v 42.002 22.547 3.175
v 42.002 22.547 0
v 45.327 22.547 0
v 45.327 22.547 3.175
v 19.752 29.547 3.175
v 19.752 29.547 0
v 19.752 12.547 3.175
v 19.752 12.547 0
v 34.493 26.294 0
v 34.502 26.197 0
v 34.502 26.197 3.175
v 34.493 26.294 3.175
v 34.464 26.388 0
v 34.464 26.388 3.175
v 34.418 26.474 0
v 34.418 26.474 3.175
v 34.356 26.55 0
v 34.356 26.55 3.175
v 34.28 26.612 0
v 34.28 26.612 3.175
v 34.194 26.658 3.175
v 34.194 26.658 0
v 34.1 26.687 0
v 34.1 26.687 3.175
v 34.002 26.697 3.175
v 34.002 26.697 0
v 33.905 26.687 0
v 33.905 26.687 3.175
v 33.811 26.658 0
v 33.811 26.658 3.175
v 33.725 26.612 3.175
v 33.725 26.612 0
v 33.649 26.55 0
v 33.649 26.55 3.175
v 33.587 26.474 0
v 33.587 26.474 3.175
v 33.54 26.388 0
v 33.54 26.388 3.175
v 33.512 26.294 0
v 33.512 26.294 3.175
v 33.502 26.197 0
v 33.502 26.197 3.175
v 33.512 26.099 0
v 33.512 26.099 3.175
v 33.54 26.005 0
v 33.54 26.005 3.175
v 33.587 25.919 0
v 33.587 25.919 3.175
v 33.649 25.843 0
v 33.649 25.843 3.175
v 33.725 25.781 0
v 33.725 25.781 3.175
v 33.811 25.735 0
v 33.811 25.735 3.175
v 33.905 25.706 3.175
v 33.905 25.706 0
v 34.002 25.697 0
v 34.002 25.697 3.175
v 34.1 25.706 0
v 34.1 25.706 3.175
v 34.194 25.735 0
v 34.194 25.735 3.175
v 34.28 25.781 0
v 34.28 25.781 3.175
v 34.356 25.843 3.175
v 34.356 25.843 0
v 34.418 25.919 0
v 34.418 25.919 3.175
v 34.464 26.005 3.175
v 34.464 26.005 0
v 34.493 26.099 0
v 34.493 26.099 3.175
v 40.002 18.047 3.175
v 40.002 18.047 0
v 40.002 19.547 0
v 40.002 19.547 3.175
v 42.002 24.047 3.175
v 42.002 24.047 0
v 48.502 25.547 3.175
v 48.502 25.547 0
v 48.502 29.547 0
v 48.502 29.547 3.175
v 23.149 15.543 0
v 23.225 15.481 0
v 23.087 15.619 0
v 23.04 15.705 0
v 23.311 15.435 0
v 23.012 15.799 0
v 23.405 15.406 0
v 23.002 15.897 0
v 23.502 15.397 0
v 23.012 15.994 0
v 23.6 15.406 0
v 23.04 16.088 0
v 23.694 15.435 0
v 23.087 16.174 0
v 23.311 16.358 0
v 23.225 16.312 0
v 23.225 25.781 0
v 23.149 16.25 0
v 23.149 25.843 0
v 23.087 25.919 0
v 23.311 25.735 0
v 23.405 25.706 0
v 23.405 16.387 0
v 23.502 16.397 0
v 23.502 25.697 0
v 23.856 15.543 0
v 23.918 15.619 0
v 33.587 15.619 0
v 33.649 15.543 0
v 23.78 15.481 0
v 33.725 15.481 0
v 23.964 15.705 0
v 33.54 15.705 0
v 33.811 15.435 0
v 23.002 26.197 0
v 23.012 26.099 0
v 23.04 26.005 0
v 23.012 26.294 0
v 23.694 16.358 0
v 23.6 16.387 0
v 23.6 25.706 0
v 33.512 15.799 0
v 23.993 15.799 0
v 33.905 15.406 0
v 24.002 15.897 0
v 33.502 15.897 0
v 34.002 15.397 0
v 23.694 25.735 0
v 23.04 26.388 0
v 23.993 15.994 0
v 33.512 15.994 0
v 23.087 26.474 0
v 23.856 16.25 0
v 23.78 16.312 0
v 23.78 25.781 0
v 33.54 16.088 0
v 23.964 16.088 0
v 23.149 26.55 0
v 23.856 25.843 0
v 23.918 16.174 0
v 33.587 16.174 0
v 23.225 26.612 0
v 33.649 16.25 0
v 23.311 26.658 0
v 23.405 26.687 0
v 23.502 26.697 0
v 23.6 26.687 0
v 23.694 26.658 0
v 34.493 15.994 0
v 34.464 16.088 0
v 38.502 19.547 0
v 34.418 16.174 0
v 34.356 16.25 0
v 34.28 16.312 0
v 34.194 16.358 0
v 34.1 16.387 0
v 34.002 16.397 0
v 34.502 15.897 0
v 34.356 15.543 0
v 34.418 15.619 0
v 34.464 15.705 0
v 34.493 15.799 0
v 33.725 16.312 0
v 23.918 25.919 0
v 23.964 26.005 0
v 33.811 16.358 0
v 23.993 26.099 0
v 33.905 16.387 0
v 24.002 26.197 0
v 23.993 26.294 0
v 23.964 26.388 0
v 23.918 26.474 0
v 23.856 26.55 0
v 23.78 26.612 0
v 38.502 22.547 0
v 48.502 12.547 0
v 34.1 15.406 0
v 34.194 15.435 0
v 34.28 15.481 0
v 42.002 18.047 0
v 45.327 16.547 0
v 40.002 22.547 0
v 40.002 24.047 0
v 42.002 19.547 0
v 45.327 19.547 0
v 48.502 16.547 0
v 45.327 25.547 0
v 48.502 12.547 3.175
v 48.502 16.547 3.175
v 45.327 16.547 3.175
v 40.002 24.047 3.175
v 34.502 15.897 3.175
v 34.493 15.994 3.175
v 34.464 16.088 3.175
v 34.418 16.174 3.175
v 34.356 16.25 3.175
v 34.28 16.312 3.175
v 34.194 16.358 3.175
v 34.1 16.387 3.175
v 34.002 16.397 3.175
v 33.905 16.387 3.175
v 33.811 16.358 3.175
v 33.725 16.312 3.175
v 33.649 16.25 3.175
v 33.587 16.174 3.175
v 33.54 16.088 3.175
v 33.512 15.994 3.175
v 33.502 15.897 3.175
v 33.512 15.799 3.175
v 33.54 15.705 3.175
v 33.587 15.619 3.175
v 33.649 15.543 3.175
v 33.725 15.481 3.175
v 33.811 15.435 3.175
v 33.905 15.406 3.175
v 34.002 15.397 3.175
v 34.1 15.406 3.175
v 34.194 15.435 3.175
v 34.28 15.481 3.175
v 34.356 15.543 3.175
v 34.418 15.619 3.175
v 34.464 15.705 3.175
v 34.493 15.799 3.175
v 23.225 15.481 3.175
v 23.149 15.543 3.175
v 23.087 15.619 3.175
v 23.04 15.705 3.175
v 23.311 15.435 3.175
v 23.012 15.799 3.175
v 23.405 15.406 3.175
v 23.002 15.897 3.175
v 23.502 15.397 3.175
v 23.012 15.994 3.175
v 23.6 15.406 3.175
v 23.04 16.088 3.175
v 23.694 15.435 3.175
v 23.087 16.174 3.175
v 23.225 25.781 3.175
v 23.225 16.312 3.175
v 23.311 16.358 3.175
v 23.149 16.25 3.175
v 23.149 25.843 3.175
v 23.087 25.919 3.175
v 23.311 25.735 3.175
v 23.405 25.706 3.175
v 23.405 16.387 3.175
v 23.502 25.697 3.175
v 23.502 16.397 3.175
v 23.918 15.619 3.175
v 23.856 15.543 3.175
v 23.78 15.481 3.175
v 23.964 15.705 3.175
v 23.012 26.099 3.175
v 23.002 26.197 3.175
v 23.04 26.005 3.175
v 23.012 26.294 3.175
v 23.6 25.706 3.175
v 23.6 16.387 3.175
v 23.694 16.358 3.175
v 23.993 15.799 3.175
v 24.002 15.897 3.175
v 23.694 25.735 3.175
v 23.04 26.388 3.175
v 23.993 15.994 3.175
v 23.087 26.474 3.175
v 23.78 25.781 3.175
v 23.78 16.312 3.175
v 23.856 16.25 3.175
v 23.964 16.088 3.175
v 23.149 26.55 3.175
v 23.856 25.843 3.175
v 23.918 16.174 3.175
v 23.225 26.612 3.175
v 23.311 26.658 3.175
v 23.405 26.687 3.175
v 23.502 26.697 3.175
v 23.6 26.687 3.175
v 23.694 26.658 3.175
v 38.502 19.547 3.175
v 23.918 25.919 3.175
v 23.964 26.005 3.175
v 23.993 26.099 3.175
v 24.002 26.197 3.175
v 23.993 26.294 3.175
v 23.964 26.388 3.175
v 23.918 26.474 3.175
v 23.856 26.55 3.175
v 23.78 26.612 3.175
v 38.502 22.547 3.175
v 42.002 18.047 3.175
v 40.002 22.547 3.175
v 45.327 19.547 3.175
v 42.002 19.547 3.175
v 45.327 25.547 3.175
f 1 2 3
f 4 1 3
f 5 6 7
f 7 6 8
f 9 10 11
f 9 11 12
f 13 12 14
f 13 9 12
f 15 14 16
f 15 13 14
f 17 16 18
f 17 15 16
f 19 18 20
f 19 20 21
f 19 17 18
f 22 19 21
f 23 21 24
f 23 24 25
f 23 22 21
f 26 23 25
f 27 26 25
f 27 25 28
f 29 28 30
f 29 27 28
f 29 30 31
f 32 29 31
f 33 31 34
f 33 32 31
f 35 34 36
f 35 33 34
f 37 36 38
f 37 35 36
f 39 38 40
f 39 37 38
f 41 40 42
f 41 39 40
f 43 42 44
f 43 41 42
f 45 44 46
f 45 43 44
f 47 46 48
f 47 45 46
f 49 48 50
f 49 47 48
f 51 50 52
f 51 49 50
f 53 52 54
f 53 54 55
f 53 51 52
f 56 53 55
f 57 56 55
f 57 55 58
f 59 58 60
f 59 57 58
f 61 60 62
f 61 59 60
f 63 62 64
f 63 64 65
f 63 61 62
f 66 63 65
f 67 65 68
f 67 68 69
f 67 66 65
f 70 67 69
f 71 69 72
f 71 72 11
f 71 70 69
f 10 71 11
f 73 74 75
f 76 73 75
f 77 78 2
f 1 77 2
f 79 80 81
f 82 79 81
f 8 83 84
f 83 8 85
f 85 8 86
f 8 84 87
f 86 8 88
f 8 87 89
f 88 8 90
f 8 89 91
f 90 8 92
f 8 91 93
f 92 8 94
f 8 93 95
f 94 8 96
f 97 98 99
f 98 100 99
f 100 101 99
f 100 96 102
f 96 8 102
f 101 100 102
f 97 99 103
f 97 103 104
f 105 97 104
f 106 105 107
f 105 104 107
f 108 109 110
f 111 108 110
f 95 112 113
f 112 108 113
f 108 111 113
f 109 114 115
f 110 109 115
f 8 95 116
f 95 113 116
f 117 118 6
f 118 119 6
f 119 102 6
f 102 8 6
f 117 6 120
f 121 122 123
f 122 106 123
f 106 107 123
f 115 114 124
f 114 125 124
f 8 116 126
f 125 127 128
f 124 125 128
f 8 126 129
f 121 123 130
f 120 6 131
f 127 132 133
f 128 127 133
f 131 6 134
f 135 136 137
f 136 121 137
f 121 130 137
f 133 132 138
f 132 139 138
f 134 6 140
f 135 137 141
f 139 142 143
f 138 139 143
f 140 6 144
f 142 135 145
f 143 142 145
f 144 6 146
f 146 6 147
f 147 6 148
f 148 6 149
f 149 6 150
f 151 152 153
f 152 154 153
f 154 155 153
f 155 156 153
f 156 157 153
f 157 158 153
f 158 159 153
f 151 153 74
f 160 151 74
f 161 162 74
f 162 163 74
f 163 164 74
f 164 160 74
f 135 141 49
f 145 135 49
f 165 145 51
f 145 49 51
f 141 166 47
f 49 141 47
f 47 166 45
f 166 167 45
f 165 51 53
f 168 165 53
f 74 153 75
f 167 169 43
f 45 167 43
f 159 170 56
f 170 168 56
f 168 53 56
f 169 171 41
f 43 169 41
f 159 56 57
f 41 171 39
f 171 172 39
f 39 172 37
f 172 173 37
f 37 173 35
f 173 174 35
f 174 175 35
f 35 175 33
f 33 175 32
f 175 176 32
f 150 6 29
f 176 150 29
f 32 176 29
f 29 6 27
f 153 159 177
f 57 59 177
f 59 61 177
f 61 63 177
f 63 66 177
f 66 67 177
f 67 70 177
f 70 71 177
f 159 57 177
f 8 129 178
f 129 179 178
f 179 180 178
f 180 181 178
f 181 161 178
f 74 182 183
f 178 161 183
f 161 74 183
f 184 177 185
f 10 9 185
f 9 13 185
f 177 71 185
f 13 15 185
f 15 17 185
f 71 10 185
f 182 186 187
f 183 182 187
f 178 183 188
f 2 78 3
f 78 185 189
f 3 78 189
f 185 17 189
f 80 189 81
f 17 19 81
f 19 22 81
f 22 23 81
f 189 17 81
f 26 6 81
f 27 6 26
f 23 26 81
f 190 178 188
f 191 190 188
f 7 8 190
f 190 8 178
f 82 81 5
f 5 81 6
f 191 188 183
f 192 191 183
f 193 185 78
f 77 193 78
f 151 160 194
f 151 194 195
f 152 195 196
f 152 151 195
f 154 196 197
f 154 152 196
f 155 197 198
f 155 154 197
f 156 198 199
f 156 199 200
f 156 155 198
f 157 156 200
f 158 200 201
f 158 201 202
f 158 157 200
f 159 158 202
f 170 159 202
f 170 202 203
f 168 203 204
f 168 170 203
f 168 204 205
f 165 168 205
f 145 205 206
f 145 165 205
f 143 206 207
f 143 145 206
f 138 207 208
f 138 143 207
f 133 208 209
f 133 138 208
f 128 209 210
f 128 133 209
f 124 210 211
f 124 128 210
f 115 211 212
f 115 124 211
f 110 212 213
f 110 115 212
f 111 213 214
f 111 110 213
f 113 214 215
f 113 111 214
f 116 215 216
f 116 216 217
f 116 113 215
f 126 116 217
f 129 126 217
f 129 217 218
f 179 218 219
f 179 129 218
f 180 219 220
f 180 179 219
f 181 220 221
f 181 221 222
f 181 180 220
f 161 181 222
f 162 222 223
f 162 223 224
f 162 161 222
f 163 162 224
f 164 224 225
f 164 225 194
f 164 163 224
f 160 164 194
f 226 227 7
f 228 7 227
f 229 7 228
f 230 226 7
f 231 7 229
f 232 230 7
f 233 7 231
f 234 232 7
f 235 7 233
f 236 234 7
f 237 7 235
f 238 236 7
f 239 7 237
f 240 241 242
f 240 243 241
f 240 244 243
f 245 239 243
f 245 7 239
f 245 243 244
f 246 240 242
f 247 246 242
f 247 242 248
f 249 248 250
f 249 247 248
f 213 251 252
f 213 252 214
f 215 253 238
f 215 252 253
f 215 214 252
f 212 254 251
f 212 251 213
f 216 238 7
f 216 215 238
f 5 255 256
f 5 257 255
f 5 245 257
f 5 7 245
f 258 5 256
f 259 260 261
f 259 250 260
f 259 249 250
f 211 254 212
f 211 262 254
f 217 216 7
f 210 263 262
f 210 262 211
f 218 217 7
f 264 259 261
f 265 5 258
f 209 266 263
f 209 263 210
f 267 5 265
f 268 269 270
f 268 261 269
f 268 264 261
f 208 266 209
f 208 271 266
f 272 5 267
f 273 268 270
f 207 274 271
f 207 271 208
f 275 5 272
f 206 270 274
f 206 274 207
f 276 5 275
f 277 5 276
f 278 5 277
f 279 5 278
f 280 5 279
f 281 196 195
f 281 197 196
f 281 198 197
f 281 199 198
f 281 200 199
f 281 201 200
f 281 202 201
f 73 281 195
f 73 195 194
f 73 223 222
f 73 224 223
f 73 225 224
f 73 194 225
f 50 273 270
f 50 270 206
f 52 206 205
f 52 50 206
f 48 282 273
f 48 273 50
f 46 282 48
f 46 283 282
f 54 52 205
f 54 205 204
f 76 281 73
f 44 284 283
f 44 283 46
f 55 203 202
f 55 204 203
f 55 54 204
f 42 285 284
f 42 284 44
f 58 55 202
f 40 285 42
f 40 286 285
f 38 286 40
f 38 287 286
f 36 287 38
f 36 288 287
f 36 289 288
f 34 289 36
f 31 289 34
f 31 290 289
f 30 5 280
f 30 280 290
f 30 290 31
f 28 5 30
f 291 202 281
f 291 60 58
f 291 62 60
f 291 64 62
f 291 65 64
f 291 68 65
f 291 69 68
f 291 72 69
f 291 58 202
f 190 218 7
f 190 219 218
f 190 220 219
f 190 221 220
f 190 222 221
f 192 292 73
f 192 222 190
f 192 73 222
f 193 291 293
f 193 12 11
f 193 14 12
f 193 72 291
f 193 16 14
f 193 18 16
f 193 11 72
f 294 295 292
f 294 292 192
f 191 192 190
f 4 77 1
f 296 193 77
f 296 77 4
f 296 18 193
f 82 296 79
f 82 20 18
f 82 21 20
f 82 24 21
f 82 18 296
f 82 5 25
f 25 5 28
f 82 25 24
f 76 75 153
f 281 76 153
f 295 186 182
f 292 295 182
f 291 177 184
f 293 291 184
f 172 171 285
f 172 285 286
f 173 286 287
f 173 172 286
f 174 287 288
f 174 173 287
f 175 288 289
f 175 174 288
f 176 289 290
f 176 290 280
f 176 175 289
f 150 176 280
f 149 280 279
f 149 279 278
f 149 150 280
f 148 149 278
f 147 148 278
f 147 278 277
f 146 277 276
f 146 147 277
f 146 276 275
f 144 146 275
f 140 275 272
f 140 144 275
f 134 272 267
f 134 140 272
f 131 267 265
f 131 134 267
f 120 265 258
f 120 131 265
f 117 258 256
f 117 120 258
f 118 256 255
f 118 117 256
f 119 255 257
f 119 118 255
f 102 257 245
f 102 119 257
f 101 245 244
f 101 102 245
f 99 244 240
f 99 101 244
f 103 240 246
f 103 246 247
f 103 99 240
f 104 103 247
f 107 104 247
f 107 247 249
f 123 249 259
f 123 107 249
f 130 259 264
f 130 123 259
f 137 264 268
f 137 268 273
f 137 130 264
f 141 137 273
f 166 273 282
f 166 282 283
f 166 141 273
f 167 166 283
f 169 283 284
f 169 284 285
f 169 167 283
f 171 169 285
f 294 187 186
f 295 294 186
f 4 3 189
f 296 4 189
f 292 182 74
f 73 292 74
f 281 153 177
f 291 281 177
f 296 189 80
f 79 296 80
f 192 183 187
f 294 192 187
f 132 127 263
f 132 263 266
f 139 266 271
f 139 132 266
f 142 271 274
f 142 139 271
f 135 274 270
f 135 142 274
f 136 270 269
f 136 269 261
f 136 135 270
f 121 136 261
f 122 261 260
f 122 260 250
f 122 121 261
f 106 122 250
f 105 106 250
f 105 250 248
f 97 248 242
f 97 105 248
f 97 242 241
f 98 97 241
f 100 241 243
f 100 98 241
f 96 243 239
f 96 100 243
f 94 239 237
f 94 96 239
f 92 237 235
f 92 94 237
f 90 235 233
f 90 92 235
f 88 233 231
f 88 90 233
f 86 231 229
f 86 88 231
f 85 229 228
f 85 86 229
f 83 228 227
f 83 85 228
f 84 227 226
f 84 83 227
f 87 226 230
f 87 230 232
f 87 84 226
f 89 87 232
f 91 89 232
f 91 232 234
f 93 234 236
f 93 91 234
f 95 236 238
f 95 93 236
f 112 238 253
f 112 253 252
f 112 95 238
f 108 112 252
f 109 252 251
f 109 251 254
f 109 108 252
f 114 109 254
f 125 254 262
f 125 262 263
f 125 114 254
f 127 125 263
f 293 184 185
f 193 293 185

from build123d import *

# Parameters (mm, degrees)
F0_R     = 0.5
F1_DEPTH = 3.175


# Not quite as in the source:
# - a length typed as a fraction of an inch, garbled in the dataset ("3 / 203.2 mm" for 3/8 in), is restored


with BuildPart() as f1:
    # F0 (on Top) → F1 (new body)
    with BuildSketch(Plane.XY):
        Polygon((38.5022973402, 19.5465350598), (38.5022973402, 22.5465350598), (40.0022973402, 22.5465350598), (40.0022973402, 24.0465350598), (42.0022973402, 24.0465350598), (42.0022973402, 22.5465350598), (45.3272973402, 22.5465350598), (45.3272973402, 25.5465350598), (48.5022973402, 25.5465350598), (48.5022973402, 29.5465350598), (45.3272973402, 29.5465350598), (19.7522973402, 29.5465350598), (19.7522973402, 12.5465350598), (45.3272973402, 12.5465350598), (48.5022973402, 12.5465350598), (48.5022973402, 16.5465350598), (45.3272973402, 16.5465350598), (45.3272973402, 19.5465350598), (42.0022973402, 19.5465350598), (42.0022973402, 18.0465350598), (40.0022973402, 18.0465350598), (40.0022973402, 19.5465350598), align=None)
        with Locations((23.5022973402, 15.8965350598)):
            Circle(F0_R, mode=Mode.SUBTRACT)
        with Locations((34.0022973402, 15.8965350598)):
            Circle(F0_R, mode=Mode.SUBTRACT)
        with Locations((23.5022973402, 26.1965350598)):
            Circle(F0_R, mode=Mode.SUBTRACT)
        with Locations((34.0022973402, 26.1965350598)):
            Circle(F0_R, mode=Mode.SUBTRACT)
    extrude(amount=F1_DEPTH)


solid = f1.part
